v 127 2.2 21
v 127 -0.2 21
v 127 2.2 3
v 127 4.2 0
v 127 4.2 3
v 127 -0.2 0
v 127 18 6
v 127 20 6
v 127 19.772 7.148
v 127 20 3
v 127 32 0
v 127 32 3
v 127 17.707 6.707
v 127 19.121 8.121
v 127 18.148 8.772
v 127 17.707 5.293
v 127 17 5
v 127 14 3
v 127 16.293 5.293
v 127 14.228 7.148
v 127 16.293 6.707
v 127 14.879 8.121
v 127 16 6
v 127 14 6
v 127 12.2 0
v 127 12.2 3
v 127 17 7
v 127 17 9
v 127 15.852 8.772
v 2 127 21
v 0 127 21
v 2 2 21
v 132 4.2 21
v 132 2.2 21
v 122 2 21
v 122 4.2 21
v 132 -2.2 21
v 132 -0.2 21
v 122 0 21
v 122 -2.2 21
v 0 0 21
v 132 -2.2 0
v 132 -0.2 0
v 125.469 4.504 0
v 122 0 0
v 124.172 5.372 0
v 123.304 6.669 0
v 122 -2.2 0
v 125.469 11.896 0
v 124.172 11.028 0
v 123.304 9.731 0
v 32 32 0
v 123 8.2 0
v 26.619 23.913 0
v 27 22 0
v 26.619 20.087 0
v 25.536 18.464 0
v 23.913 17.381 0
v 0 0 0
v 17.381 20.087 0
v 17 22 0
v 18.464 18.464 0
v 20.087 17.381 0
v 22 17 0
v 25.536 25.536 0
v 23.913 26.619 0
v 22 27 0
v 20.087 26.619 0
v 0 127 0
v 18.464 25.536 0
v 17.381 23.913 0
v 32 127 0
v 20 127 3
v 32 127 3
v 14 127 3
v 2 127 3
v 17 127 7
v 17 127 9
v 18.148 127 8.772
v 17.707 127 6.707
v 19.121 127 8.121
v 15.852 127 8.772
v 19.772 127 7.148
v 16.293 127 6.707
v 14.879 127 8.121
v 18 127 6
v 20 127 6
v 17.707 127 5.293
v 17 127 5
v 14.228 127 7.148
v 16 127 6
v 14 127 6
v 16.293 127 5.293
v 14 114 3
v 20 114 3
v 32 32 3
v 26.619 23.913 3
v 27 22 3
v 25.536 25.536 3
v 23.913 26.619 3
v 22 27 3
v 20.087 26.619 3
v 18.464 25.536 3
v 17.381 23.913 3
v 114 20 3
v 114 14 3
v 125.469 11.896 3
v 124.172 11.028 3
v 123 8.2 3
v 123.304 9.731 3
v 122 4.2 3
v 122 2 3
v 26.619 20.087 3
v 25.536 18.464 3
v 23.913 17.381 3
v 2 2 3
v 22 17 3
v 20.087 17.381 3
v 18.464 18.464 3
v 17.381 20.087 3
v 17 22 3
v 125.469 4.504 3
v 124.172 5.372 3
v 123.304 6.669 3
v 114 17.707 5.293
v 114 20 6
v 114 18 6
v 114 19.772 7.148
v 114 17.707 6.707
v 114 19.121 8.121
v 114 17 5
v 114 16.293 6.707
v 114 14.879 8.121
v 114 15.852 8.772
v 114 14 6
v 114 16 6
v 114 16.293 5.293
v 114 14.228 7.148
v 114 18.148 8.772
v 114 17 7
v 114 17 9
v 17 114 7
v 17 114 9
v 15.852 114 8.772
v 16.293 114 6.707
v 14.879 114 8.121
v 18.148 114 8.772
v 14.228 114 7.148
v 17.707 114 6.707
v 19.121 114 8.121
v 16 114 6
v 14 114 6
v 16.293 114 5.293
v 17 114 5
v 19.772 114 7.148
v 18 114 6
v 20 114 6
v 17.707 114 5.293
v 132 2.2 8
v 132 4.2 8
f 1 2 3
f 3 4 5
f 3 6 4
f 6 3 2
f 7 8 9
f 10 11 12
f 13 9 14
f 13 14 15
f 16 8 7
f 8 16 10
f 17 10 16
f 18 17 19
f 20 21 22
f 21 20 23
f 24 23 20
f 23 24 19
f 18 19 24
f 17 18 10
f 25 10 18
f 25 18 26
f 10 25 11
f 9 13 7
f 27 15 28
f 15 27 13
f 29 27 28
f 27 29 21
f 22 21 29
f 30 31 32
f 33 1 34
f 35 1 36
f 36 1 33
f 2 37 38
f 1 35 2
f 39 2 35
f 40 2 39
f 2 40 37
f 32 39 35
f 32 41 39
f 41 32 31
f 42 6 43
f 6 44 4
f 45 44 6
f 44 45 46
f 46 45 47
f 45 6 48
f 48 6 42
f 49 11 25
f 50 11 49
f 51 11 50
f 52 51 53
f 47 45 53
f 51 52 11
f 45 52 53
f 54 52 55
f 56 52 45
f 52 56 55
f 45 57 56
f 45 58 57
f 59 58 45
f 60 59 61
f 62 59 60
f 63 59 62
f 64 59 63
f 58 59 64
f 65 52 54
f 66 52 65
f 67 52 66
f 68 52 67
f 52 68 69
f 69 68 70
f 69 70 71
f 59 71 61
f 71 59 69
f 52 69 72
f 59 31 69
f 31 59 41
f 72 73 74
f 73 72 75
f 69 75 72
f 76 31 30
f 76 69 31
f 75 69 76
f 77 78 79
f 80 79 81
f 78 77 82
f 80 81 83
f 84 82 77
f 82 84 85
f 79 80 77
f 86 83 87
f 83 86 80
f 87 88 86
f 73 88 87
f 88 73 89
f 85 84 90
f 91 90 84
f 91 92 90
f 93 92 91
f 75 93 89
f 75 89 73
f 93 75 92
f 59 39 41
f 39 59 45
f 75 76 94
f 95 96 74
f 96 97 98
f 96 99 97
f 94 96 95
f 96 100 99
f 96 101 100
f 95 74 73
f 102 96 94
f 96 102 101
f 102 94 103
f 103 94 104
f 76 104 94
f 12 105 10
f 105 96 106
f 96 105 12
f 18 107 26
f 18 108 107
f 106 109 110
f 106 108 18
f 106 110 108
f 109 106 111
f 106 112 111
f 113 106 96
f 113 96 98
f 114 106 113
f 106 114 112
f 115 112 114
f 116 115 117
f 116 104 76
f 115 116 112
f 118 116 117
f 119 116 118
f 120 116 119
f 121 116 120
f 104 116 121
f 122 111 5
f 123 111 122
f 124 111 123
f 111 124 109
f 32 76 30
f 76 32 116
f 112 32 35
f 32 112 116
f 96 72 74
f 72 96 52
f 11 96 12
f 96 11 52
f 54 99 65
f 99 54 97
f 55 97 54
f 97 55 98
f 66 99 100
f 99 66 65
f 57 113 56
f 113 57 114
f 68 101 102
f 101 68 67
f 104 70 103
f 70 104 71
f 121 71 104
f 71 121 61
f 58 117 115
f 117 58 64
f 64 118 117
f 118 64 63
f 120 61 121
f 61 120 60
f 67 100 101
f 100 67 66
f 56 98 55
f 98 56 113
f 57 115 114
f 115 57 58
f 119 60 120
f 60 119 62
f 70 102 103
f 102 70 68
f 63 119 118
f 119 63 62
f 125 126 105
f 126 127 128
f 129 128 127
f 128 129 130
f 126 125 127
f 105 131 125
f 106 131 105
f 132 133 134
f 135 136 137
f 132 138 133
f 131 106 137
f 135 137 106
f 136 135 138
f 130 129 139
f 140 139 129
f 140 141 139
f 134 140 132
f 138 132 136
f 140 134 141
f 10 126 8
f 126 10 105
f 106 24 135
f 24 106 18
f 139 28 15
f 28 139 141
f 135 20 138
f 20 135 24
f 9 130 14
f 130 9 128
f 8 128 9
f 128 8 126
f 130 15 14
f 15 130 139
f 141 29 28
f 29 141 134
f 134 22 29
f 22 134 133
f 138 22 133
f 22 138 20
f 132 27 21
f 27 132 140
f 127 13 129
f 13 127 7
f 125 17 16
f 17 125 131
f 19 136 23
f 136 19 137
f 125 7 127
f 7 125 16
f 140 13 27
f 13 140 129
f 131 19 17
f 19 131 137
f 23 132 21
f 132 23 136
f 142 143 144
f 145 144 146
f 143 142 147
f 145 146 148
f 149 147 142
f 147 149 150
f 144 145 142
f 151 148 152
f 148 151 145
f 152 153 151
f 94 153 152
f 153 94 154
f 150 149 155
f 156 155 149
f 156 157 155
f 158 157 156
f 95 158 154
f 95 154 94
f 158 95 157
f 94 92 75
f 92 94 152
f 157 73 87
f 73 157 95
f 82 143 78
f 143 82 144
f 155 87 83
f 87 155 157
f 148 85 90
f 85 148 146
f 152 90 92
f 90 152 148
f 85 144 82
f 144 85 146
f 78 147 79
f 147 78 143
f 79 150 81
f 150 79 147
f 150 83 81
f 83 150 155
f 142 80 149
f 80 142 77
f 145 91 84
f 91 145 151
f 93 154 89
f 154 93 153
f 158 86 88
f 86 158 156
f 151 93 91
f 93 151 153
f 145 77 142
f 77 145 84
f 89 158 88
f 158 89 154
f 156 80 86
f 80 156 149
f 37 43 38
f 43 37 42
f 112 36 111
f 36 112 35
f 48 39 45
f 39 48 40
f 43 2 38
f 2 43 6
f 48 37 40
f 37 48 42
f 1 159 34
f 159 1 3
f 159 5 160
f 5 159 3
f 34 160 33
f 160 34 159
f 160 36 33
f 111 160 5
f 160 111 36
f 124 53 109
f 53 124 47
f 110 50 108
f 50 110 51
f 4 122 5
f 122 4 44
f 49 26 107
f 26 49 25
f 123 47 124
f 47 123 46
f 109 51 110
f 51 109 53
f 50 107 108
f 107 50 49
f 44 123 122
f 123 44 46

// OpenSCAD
// file: HeatbedIsolationModule.scad
thicknessBottom=3;
thicknessWall=2;

length=125;
totalLength=length+thicknessWall;

bottomLength=30;
bottomLengthWithOffset=bottomLength+thicknessWall;

height=18;
totalHeight=height+thicknessBottom;

bedHolderHoleDiameter=10;
bedHolderHoleOffset=20;

m3Diameter=3.4;
screwM3HolderDiameter=6;
screwM3HolderRadius=screwM3HolderDiameter/2;
screwM3HolderLength=13;

latchLength=5;
latchOffset=0.2;

wireHoleDiameter=8;

module screwM3Holder()
{
	difference()
	{
		union()
		{
			cube([screwM3HolderLength,screwM3HolderDiameter,screwM3HolderDiameter/2]);
			
			translate([0,screwM3HolderRadius,screwM3HolderRadius])
			rotate([0,90,0])
			cylinder(d=screwM3HolderDiameter,h=screwM3HolderLength,$fn=16);
		}
		
		translate([0,screwM3HolderRadius,screwM3HolderRadius])
		rotate([0,90,0])
		cylinder(d=2,h=screwM3HolderLength,$fn=8);
	}
}

module heatbedIsolation()
union()
{
	difference()
	{
		cube([totalLength,totalLength,totalHeight]);
		
		translate([thicknessWall,thicknessWall,thicknessBottom])
		cube([length+1,length+1,height+1]);
		
		translate([bottomLengthWithOffset,bottomLengthWithOffset,-1])
		cube([length-bottomLength+1,length-bottomLength+1,thicknessBottom+2]);
		
		translate([thicknessWall+bedHolderHoleOffset,thicknessWall+bedHolderHoleOffset,-1])
		cylinder(d=bedHolderHoleDiameter,h=thicknessBottom+2,$fn=16);
	}
	
	//Latch begin
	translate([totalLength-latchLength,-thicknessWall-latchOffset,0])
	cube([2*latchLength,thicknessWall,totalHeight]);
	
	translate([totalLength-latchLength,-thicknessWall-latchOffset,0])
	cube([latchLength,3*thicknessWall+latchOffset,totalHeight]);
	
	translate([totalLength-latchLength,2*thicknessWall+latchOffset,thicknessBottom])
	rotate([90,0,0])
	linear_extrude(thicknessWall)
	polygon([
		[0,0],
		[latchLength,0],
		[2*latchLength,latchLength],
		[2*latchLength,height],
		[0,height],
	]);
	//Latch end
	
	translate([totalLength-screwM3HolderLength,thicknessWall+(bottomLength-screwM3HolderDiameter)/2,thicknessBottom])
	screwM3Holder();
	
	translate([thicknessWall+screwM3HolderDiameter+(bottomLength-screwM3HolderDiameter)/2,totalLength-screwM3HolderLength,thicknessBottom])
	rotate([0,0,90])
	screwM3Holder();
}
// main file
include<HeatbedIsolationModule.scad>

difference()
{
	heatbedIsolation();
	
	translate([totalLength,2*thicknessWall+latchOffset+wireHoleDiameter/2,-1])
	cylinder(d=wireHoleDiameter,h=thicknessBottom+2,$fn=16);
}
